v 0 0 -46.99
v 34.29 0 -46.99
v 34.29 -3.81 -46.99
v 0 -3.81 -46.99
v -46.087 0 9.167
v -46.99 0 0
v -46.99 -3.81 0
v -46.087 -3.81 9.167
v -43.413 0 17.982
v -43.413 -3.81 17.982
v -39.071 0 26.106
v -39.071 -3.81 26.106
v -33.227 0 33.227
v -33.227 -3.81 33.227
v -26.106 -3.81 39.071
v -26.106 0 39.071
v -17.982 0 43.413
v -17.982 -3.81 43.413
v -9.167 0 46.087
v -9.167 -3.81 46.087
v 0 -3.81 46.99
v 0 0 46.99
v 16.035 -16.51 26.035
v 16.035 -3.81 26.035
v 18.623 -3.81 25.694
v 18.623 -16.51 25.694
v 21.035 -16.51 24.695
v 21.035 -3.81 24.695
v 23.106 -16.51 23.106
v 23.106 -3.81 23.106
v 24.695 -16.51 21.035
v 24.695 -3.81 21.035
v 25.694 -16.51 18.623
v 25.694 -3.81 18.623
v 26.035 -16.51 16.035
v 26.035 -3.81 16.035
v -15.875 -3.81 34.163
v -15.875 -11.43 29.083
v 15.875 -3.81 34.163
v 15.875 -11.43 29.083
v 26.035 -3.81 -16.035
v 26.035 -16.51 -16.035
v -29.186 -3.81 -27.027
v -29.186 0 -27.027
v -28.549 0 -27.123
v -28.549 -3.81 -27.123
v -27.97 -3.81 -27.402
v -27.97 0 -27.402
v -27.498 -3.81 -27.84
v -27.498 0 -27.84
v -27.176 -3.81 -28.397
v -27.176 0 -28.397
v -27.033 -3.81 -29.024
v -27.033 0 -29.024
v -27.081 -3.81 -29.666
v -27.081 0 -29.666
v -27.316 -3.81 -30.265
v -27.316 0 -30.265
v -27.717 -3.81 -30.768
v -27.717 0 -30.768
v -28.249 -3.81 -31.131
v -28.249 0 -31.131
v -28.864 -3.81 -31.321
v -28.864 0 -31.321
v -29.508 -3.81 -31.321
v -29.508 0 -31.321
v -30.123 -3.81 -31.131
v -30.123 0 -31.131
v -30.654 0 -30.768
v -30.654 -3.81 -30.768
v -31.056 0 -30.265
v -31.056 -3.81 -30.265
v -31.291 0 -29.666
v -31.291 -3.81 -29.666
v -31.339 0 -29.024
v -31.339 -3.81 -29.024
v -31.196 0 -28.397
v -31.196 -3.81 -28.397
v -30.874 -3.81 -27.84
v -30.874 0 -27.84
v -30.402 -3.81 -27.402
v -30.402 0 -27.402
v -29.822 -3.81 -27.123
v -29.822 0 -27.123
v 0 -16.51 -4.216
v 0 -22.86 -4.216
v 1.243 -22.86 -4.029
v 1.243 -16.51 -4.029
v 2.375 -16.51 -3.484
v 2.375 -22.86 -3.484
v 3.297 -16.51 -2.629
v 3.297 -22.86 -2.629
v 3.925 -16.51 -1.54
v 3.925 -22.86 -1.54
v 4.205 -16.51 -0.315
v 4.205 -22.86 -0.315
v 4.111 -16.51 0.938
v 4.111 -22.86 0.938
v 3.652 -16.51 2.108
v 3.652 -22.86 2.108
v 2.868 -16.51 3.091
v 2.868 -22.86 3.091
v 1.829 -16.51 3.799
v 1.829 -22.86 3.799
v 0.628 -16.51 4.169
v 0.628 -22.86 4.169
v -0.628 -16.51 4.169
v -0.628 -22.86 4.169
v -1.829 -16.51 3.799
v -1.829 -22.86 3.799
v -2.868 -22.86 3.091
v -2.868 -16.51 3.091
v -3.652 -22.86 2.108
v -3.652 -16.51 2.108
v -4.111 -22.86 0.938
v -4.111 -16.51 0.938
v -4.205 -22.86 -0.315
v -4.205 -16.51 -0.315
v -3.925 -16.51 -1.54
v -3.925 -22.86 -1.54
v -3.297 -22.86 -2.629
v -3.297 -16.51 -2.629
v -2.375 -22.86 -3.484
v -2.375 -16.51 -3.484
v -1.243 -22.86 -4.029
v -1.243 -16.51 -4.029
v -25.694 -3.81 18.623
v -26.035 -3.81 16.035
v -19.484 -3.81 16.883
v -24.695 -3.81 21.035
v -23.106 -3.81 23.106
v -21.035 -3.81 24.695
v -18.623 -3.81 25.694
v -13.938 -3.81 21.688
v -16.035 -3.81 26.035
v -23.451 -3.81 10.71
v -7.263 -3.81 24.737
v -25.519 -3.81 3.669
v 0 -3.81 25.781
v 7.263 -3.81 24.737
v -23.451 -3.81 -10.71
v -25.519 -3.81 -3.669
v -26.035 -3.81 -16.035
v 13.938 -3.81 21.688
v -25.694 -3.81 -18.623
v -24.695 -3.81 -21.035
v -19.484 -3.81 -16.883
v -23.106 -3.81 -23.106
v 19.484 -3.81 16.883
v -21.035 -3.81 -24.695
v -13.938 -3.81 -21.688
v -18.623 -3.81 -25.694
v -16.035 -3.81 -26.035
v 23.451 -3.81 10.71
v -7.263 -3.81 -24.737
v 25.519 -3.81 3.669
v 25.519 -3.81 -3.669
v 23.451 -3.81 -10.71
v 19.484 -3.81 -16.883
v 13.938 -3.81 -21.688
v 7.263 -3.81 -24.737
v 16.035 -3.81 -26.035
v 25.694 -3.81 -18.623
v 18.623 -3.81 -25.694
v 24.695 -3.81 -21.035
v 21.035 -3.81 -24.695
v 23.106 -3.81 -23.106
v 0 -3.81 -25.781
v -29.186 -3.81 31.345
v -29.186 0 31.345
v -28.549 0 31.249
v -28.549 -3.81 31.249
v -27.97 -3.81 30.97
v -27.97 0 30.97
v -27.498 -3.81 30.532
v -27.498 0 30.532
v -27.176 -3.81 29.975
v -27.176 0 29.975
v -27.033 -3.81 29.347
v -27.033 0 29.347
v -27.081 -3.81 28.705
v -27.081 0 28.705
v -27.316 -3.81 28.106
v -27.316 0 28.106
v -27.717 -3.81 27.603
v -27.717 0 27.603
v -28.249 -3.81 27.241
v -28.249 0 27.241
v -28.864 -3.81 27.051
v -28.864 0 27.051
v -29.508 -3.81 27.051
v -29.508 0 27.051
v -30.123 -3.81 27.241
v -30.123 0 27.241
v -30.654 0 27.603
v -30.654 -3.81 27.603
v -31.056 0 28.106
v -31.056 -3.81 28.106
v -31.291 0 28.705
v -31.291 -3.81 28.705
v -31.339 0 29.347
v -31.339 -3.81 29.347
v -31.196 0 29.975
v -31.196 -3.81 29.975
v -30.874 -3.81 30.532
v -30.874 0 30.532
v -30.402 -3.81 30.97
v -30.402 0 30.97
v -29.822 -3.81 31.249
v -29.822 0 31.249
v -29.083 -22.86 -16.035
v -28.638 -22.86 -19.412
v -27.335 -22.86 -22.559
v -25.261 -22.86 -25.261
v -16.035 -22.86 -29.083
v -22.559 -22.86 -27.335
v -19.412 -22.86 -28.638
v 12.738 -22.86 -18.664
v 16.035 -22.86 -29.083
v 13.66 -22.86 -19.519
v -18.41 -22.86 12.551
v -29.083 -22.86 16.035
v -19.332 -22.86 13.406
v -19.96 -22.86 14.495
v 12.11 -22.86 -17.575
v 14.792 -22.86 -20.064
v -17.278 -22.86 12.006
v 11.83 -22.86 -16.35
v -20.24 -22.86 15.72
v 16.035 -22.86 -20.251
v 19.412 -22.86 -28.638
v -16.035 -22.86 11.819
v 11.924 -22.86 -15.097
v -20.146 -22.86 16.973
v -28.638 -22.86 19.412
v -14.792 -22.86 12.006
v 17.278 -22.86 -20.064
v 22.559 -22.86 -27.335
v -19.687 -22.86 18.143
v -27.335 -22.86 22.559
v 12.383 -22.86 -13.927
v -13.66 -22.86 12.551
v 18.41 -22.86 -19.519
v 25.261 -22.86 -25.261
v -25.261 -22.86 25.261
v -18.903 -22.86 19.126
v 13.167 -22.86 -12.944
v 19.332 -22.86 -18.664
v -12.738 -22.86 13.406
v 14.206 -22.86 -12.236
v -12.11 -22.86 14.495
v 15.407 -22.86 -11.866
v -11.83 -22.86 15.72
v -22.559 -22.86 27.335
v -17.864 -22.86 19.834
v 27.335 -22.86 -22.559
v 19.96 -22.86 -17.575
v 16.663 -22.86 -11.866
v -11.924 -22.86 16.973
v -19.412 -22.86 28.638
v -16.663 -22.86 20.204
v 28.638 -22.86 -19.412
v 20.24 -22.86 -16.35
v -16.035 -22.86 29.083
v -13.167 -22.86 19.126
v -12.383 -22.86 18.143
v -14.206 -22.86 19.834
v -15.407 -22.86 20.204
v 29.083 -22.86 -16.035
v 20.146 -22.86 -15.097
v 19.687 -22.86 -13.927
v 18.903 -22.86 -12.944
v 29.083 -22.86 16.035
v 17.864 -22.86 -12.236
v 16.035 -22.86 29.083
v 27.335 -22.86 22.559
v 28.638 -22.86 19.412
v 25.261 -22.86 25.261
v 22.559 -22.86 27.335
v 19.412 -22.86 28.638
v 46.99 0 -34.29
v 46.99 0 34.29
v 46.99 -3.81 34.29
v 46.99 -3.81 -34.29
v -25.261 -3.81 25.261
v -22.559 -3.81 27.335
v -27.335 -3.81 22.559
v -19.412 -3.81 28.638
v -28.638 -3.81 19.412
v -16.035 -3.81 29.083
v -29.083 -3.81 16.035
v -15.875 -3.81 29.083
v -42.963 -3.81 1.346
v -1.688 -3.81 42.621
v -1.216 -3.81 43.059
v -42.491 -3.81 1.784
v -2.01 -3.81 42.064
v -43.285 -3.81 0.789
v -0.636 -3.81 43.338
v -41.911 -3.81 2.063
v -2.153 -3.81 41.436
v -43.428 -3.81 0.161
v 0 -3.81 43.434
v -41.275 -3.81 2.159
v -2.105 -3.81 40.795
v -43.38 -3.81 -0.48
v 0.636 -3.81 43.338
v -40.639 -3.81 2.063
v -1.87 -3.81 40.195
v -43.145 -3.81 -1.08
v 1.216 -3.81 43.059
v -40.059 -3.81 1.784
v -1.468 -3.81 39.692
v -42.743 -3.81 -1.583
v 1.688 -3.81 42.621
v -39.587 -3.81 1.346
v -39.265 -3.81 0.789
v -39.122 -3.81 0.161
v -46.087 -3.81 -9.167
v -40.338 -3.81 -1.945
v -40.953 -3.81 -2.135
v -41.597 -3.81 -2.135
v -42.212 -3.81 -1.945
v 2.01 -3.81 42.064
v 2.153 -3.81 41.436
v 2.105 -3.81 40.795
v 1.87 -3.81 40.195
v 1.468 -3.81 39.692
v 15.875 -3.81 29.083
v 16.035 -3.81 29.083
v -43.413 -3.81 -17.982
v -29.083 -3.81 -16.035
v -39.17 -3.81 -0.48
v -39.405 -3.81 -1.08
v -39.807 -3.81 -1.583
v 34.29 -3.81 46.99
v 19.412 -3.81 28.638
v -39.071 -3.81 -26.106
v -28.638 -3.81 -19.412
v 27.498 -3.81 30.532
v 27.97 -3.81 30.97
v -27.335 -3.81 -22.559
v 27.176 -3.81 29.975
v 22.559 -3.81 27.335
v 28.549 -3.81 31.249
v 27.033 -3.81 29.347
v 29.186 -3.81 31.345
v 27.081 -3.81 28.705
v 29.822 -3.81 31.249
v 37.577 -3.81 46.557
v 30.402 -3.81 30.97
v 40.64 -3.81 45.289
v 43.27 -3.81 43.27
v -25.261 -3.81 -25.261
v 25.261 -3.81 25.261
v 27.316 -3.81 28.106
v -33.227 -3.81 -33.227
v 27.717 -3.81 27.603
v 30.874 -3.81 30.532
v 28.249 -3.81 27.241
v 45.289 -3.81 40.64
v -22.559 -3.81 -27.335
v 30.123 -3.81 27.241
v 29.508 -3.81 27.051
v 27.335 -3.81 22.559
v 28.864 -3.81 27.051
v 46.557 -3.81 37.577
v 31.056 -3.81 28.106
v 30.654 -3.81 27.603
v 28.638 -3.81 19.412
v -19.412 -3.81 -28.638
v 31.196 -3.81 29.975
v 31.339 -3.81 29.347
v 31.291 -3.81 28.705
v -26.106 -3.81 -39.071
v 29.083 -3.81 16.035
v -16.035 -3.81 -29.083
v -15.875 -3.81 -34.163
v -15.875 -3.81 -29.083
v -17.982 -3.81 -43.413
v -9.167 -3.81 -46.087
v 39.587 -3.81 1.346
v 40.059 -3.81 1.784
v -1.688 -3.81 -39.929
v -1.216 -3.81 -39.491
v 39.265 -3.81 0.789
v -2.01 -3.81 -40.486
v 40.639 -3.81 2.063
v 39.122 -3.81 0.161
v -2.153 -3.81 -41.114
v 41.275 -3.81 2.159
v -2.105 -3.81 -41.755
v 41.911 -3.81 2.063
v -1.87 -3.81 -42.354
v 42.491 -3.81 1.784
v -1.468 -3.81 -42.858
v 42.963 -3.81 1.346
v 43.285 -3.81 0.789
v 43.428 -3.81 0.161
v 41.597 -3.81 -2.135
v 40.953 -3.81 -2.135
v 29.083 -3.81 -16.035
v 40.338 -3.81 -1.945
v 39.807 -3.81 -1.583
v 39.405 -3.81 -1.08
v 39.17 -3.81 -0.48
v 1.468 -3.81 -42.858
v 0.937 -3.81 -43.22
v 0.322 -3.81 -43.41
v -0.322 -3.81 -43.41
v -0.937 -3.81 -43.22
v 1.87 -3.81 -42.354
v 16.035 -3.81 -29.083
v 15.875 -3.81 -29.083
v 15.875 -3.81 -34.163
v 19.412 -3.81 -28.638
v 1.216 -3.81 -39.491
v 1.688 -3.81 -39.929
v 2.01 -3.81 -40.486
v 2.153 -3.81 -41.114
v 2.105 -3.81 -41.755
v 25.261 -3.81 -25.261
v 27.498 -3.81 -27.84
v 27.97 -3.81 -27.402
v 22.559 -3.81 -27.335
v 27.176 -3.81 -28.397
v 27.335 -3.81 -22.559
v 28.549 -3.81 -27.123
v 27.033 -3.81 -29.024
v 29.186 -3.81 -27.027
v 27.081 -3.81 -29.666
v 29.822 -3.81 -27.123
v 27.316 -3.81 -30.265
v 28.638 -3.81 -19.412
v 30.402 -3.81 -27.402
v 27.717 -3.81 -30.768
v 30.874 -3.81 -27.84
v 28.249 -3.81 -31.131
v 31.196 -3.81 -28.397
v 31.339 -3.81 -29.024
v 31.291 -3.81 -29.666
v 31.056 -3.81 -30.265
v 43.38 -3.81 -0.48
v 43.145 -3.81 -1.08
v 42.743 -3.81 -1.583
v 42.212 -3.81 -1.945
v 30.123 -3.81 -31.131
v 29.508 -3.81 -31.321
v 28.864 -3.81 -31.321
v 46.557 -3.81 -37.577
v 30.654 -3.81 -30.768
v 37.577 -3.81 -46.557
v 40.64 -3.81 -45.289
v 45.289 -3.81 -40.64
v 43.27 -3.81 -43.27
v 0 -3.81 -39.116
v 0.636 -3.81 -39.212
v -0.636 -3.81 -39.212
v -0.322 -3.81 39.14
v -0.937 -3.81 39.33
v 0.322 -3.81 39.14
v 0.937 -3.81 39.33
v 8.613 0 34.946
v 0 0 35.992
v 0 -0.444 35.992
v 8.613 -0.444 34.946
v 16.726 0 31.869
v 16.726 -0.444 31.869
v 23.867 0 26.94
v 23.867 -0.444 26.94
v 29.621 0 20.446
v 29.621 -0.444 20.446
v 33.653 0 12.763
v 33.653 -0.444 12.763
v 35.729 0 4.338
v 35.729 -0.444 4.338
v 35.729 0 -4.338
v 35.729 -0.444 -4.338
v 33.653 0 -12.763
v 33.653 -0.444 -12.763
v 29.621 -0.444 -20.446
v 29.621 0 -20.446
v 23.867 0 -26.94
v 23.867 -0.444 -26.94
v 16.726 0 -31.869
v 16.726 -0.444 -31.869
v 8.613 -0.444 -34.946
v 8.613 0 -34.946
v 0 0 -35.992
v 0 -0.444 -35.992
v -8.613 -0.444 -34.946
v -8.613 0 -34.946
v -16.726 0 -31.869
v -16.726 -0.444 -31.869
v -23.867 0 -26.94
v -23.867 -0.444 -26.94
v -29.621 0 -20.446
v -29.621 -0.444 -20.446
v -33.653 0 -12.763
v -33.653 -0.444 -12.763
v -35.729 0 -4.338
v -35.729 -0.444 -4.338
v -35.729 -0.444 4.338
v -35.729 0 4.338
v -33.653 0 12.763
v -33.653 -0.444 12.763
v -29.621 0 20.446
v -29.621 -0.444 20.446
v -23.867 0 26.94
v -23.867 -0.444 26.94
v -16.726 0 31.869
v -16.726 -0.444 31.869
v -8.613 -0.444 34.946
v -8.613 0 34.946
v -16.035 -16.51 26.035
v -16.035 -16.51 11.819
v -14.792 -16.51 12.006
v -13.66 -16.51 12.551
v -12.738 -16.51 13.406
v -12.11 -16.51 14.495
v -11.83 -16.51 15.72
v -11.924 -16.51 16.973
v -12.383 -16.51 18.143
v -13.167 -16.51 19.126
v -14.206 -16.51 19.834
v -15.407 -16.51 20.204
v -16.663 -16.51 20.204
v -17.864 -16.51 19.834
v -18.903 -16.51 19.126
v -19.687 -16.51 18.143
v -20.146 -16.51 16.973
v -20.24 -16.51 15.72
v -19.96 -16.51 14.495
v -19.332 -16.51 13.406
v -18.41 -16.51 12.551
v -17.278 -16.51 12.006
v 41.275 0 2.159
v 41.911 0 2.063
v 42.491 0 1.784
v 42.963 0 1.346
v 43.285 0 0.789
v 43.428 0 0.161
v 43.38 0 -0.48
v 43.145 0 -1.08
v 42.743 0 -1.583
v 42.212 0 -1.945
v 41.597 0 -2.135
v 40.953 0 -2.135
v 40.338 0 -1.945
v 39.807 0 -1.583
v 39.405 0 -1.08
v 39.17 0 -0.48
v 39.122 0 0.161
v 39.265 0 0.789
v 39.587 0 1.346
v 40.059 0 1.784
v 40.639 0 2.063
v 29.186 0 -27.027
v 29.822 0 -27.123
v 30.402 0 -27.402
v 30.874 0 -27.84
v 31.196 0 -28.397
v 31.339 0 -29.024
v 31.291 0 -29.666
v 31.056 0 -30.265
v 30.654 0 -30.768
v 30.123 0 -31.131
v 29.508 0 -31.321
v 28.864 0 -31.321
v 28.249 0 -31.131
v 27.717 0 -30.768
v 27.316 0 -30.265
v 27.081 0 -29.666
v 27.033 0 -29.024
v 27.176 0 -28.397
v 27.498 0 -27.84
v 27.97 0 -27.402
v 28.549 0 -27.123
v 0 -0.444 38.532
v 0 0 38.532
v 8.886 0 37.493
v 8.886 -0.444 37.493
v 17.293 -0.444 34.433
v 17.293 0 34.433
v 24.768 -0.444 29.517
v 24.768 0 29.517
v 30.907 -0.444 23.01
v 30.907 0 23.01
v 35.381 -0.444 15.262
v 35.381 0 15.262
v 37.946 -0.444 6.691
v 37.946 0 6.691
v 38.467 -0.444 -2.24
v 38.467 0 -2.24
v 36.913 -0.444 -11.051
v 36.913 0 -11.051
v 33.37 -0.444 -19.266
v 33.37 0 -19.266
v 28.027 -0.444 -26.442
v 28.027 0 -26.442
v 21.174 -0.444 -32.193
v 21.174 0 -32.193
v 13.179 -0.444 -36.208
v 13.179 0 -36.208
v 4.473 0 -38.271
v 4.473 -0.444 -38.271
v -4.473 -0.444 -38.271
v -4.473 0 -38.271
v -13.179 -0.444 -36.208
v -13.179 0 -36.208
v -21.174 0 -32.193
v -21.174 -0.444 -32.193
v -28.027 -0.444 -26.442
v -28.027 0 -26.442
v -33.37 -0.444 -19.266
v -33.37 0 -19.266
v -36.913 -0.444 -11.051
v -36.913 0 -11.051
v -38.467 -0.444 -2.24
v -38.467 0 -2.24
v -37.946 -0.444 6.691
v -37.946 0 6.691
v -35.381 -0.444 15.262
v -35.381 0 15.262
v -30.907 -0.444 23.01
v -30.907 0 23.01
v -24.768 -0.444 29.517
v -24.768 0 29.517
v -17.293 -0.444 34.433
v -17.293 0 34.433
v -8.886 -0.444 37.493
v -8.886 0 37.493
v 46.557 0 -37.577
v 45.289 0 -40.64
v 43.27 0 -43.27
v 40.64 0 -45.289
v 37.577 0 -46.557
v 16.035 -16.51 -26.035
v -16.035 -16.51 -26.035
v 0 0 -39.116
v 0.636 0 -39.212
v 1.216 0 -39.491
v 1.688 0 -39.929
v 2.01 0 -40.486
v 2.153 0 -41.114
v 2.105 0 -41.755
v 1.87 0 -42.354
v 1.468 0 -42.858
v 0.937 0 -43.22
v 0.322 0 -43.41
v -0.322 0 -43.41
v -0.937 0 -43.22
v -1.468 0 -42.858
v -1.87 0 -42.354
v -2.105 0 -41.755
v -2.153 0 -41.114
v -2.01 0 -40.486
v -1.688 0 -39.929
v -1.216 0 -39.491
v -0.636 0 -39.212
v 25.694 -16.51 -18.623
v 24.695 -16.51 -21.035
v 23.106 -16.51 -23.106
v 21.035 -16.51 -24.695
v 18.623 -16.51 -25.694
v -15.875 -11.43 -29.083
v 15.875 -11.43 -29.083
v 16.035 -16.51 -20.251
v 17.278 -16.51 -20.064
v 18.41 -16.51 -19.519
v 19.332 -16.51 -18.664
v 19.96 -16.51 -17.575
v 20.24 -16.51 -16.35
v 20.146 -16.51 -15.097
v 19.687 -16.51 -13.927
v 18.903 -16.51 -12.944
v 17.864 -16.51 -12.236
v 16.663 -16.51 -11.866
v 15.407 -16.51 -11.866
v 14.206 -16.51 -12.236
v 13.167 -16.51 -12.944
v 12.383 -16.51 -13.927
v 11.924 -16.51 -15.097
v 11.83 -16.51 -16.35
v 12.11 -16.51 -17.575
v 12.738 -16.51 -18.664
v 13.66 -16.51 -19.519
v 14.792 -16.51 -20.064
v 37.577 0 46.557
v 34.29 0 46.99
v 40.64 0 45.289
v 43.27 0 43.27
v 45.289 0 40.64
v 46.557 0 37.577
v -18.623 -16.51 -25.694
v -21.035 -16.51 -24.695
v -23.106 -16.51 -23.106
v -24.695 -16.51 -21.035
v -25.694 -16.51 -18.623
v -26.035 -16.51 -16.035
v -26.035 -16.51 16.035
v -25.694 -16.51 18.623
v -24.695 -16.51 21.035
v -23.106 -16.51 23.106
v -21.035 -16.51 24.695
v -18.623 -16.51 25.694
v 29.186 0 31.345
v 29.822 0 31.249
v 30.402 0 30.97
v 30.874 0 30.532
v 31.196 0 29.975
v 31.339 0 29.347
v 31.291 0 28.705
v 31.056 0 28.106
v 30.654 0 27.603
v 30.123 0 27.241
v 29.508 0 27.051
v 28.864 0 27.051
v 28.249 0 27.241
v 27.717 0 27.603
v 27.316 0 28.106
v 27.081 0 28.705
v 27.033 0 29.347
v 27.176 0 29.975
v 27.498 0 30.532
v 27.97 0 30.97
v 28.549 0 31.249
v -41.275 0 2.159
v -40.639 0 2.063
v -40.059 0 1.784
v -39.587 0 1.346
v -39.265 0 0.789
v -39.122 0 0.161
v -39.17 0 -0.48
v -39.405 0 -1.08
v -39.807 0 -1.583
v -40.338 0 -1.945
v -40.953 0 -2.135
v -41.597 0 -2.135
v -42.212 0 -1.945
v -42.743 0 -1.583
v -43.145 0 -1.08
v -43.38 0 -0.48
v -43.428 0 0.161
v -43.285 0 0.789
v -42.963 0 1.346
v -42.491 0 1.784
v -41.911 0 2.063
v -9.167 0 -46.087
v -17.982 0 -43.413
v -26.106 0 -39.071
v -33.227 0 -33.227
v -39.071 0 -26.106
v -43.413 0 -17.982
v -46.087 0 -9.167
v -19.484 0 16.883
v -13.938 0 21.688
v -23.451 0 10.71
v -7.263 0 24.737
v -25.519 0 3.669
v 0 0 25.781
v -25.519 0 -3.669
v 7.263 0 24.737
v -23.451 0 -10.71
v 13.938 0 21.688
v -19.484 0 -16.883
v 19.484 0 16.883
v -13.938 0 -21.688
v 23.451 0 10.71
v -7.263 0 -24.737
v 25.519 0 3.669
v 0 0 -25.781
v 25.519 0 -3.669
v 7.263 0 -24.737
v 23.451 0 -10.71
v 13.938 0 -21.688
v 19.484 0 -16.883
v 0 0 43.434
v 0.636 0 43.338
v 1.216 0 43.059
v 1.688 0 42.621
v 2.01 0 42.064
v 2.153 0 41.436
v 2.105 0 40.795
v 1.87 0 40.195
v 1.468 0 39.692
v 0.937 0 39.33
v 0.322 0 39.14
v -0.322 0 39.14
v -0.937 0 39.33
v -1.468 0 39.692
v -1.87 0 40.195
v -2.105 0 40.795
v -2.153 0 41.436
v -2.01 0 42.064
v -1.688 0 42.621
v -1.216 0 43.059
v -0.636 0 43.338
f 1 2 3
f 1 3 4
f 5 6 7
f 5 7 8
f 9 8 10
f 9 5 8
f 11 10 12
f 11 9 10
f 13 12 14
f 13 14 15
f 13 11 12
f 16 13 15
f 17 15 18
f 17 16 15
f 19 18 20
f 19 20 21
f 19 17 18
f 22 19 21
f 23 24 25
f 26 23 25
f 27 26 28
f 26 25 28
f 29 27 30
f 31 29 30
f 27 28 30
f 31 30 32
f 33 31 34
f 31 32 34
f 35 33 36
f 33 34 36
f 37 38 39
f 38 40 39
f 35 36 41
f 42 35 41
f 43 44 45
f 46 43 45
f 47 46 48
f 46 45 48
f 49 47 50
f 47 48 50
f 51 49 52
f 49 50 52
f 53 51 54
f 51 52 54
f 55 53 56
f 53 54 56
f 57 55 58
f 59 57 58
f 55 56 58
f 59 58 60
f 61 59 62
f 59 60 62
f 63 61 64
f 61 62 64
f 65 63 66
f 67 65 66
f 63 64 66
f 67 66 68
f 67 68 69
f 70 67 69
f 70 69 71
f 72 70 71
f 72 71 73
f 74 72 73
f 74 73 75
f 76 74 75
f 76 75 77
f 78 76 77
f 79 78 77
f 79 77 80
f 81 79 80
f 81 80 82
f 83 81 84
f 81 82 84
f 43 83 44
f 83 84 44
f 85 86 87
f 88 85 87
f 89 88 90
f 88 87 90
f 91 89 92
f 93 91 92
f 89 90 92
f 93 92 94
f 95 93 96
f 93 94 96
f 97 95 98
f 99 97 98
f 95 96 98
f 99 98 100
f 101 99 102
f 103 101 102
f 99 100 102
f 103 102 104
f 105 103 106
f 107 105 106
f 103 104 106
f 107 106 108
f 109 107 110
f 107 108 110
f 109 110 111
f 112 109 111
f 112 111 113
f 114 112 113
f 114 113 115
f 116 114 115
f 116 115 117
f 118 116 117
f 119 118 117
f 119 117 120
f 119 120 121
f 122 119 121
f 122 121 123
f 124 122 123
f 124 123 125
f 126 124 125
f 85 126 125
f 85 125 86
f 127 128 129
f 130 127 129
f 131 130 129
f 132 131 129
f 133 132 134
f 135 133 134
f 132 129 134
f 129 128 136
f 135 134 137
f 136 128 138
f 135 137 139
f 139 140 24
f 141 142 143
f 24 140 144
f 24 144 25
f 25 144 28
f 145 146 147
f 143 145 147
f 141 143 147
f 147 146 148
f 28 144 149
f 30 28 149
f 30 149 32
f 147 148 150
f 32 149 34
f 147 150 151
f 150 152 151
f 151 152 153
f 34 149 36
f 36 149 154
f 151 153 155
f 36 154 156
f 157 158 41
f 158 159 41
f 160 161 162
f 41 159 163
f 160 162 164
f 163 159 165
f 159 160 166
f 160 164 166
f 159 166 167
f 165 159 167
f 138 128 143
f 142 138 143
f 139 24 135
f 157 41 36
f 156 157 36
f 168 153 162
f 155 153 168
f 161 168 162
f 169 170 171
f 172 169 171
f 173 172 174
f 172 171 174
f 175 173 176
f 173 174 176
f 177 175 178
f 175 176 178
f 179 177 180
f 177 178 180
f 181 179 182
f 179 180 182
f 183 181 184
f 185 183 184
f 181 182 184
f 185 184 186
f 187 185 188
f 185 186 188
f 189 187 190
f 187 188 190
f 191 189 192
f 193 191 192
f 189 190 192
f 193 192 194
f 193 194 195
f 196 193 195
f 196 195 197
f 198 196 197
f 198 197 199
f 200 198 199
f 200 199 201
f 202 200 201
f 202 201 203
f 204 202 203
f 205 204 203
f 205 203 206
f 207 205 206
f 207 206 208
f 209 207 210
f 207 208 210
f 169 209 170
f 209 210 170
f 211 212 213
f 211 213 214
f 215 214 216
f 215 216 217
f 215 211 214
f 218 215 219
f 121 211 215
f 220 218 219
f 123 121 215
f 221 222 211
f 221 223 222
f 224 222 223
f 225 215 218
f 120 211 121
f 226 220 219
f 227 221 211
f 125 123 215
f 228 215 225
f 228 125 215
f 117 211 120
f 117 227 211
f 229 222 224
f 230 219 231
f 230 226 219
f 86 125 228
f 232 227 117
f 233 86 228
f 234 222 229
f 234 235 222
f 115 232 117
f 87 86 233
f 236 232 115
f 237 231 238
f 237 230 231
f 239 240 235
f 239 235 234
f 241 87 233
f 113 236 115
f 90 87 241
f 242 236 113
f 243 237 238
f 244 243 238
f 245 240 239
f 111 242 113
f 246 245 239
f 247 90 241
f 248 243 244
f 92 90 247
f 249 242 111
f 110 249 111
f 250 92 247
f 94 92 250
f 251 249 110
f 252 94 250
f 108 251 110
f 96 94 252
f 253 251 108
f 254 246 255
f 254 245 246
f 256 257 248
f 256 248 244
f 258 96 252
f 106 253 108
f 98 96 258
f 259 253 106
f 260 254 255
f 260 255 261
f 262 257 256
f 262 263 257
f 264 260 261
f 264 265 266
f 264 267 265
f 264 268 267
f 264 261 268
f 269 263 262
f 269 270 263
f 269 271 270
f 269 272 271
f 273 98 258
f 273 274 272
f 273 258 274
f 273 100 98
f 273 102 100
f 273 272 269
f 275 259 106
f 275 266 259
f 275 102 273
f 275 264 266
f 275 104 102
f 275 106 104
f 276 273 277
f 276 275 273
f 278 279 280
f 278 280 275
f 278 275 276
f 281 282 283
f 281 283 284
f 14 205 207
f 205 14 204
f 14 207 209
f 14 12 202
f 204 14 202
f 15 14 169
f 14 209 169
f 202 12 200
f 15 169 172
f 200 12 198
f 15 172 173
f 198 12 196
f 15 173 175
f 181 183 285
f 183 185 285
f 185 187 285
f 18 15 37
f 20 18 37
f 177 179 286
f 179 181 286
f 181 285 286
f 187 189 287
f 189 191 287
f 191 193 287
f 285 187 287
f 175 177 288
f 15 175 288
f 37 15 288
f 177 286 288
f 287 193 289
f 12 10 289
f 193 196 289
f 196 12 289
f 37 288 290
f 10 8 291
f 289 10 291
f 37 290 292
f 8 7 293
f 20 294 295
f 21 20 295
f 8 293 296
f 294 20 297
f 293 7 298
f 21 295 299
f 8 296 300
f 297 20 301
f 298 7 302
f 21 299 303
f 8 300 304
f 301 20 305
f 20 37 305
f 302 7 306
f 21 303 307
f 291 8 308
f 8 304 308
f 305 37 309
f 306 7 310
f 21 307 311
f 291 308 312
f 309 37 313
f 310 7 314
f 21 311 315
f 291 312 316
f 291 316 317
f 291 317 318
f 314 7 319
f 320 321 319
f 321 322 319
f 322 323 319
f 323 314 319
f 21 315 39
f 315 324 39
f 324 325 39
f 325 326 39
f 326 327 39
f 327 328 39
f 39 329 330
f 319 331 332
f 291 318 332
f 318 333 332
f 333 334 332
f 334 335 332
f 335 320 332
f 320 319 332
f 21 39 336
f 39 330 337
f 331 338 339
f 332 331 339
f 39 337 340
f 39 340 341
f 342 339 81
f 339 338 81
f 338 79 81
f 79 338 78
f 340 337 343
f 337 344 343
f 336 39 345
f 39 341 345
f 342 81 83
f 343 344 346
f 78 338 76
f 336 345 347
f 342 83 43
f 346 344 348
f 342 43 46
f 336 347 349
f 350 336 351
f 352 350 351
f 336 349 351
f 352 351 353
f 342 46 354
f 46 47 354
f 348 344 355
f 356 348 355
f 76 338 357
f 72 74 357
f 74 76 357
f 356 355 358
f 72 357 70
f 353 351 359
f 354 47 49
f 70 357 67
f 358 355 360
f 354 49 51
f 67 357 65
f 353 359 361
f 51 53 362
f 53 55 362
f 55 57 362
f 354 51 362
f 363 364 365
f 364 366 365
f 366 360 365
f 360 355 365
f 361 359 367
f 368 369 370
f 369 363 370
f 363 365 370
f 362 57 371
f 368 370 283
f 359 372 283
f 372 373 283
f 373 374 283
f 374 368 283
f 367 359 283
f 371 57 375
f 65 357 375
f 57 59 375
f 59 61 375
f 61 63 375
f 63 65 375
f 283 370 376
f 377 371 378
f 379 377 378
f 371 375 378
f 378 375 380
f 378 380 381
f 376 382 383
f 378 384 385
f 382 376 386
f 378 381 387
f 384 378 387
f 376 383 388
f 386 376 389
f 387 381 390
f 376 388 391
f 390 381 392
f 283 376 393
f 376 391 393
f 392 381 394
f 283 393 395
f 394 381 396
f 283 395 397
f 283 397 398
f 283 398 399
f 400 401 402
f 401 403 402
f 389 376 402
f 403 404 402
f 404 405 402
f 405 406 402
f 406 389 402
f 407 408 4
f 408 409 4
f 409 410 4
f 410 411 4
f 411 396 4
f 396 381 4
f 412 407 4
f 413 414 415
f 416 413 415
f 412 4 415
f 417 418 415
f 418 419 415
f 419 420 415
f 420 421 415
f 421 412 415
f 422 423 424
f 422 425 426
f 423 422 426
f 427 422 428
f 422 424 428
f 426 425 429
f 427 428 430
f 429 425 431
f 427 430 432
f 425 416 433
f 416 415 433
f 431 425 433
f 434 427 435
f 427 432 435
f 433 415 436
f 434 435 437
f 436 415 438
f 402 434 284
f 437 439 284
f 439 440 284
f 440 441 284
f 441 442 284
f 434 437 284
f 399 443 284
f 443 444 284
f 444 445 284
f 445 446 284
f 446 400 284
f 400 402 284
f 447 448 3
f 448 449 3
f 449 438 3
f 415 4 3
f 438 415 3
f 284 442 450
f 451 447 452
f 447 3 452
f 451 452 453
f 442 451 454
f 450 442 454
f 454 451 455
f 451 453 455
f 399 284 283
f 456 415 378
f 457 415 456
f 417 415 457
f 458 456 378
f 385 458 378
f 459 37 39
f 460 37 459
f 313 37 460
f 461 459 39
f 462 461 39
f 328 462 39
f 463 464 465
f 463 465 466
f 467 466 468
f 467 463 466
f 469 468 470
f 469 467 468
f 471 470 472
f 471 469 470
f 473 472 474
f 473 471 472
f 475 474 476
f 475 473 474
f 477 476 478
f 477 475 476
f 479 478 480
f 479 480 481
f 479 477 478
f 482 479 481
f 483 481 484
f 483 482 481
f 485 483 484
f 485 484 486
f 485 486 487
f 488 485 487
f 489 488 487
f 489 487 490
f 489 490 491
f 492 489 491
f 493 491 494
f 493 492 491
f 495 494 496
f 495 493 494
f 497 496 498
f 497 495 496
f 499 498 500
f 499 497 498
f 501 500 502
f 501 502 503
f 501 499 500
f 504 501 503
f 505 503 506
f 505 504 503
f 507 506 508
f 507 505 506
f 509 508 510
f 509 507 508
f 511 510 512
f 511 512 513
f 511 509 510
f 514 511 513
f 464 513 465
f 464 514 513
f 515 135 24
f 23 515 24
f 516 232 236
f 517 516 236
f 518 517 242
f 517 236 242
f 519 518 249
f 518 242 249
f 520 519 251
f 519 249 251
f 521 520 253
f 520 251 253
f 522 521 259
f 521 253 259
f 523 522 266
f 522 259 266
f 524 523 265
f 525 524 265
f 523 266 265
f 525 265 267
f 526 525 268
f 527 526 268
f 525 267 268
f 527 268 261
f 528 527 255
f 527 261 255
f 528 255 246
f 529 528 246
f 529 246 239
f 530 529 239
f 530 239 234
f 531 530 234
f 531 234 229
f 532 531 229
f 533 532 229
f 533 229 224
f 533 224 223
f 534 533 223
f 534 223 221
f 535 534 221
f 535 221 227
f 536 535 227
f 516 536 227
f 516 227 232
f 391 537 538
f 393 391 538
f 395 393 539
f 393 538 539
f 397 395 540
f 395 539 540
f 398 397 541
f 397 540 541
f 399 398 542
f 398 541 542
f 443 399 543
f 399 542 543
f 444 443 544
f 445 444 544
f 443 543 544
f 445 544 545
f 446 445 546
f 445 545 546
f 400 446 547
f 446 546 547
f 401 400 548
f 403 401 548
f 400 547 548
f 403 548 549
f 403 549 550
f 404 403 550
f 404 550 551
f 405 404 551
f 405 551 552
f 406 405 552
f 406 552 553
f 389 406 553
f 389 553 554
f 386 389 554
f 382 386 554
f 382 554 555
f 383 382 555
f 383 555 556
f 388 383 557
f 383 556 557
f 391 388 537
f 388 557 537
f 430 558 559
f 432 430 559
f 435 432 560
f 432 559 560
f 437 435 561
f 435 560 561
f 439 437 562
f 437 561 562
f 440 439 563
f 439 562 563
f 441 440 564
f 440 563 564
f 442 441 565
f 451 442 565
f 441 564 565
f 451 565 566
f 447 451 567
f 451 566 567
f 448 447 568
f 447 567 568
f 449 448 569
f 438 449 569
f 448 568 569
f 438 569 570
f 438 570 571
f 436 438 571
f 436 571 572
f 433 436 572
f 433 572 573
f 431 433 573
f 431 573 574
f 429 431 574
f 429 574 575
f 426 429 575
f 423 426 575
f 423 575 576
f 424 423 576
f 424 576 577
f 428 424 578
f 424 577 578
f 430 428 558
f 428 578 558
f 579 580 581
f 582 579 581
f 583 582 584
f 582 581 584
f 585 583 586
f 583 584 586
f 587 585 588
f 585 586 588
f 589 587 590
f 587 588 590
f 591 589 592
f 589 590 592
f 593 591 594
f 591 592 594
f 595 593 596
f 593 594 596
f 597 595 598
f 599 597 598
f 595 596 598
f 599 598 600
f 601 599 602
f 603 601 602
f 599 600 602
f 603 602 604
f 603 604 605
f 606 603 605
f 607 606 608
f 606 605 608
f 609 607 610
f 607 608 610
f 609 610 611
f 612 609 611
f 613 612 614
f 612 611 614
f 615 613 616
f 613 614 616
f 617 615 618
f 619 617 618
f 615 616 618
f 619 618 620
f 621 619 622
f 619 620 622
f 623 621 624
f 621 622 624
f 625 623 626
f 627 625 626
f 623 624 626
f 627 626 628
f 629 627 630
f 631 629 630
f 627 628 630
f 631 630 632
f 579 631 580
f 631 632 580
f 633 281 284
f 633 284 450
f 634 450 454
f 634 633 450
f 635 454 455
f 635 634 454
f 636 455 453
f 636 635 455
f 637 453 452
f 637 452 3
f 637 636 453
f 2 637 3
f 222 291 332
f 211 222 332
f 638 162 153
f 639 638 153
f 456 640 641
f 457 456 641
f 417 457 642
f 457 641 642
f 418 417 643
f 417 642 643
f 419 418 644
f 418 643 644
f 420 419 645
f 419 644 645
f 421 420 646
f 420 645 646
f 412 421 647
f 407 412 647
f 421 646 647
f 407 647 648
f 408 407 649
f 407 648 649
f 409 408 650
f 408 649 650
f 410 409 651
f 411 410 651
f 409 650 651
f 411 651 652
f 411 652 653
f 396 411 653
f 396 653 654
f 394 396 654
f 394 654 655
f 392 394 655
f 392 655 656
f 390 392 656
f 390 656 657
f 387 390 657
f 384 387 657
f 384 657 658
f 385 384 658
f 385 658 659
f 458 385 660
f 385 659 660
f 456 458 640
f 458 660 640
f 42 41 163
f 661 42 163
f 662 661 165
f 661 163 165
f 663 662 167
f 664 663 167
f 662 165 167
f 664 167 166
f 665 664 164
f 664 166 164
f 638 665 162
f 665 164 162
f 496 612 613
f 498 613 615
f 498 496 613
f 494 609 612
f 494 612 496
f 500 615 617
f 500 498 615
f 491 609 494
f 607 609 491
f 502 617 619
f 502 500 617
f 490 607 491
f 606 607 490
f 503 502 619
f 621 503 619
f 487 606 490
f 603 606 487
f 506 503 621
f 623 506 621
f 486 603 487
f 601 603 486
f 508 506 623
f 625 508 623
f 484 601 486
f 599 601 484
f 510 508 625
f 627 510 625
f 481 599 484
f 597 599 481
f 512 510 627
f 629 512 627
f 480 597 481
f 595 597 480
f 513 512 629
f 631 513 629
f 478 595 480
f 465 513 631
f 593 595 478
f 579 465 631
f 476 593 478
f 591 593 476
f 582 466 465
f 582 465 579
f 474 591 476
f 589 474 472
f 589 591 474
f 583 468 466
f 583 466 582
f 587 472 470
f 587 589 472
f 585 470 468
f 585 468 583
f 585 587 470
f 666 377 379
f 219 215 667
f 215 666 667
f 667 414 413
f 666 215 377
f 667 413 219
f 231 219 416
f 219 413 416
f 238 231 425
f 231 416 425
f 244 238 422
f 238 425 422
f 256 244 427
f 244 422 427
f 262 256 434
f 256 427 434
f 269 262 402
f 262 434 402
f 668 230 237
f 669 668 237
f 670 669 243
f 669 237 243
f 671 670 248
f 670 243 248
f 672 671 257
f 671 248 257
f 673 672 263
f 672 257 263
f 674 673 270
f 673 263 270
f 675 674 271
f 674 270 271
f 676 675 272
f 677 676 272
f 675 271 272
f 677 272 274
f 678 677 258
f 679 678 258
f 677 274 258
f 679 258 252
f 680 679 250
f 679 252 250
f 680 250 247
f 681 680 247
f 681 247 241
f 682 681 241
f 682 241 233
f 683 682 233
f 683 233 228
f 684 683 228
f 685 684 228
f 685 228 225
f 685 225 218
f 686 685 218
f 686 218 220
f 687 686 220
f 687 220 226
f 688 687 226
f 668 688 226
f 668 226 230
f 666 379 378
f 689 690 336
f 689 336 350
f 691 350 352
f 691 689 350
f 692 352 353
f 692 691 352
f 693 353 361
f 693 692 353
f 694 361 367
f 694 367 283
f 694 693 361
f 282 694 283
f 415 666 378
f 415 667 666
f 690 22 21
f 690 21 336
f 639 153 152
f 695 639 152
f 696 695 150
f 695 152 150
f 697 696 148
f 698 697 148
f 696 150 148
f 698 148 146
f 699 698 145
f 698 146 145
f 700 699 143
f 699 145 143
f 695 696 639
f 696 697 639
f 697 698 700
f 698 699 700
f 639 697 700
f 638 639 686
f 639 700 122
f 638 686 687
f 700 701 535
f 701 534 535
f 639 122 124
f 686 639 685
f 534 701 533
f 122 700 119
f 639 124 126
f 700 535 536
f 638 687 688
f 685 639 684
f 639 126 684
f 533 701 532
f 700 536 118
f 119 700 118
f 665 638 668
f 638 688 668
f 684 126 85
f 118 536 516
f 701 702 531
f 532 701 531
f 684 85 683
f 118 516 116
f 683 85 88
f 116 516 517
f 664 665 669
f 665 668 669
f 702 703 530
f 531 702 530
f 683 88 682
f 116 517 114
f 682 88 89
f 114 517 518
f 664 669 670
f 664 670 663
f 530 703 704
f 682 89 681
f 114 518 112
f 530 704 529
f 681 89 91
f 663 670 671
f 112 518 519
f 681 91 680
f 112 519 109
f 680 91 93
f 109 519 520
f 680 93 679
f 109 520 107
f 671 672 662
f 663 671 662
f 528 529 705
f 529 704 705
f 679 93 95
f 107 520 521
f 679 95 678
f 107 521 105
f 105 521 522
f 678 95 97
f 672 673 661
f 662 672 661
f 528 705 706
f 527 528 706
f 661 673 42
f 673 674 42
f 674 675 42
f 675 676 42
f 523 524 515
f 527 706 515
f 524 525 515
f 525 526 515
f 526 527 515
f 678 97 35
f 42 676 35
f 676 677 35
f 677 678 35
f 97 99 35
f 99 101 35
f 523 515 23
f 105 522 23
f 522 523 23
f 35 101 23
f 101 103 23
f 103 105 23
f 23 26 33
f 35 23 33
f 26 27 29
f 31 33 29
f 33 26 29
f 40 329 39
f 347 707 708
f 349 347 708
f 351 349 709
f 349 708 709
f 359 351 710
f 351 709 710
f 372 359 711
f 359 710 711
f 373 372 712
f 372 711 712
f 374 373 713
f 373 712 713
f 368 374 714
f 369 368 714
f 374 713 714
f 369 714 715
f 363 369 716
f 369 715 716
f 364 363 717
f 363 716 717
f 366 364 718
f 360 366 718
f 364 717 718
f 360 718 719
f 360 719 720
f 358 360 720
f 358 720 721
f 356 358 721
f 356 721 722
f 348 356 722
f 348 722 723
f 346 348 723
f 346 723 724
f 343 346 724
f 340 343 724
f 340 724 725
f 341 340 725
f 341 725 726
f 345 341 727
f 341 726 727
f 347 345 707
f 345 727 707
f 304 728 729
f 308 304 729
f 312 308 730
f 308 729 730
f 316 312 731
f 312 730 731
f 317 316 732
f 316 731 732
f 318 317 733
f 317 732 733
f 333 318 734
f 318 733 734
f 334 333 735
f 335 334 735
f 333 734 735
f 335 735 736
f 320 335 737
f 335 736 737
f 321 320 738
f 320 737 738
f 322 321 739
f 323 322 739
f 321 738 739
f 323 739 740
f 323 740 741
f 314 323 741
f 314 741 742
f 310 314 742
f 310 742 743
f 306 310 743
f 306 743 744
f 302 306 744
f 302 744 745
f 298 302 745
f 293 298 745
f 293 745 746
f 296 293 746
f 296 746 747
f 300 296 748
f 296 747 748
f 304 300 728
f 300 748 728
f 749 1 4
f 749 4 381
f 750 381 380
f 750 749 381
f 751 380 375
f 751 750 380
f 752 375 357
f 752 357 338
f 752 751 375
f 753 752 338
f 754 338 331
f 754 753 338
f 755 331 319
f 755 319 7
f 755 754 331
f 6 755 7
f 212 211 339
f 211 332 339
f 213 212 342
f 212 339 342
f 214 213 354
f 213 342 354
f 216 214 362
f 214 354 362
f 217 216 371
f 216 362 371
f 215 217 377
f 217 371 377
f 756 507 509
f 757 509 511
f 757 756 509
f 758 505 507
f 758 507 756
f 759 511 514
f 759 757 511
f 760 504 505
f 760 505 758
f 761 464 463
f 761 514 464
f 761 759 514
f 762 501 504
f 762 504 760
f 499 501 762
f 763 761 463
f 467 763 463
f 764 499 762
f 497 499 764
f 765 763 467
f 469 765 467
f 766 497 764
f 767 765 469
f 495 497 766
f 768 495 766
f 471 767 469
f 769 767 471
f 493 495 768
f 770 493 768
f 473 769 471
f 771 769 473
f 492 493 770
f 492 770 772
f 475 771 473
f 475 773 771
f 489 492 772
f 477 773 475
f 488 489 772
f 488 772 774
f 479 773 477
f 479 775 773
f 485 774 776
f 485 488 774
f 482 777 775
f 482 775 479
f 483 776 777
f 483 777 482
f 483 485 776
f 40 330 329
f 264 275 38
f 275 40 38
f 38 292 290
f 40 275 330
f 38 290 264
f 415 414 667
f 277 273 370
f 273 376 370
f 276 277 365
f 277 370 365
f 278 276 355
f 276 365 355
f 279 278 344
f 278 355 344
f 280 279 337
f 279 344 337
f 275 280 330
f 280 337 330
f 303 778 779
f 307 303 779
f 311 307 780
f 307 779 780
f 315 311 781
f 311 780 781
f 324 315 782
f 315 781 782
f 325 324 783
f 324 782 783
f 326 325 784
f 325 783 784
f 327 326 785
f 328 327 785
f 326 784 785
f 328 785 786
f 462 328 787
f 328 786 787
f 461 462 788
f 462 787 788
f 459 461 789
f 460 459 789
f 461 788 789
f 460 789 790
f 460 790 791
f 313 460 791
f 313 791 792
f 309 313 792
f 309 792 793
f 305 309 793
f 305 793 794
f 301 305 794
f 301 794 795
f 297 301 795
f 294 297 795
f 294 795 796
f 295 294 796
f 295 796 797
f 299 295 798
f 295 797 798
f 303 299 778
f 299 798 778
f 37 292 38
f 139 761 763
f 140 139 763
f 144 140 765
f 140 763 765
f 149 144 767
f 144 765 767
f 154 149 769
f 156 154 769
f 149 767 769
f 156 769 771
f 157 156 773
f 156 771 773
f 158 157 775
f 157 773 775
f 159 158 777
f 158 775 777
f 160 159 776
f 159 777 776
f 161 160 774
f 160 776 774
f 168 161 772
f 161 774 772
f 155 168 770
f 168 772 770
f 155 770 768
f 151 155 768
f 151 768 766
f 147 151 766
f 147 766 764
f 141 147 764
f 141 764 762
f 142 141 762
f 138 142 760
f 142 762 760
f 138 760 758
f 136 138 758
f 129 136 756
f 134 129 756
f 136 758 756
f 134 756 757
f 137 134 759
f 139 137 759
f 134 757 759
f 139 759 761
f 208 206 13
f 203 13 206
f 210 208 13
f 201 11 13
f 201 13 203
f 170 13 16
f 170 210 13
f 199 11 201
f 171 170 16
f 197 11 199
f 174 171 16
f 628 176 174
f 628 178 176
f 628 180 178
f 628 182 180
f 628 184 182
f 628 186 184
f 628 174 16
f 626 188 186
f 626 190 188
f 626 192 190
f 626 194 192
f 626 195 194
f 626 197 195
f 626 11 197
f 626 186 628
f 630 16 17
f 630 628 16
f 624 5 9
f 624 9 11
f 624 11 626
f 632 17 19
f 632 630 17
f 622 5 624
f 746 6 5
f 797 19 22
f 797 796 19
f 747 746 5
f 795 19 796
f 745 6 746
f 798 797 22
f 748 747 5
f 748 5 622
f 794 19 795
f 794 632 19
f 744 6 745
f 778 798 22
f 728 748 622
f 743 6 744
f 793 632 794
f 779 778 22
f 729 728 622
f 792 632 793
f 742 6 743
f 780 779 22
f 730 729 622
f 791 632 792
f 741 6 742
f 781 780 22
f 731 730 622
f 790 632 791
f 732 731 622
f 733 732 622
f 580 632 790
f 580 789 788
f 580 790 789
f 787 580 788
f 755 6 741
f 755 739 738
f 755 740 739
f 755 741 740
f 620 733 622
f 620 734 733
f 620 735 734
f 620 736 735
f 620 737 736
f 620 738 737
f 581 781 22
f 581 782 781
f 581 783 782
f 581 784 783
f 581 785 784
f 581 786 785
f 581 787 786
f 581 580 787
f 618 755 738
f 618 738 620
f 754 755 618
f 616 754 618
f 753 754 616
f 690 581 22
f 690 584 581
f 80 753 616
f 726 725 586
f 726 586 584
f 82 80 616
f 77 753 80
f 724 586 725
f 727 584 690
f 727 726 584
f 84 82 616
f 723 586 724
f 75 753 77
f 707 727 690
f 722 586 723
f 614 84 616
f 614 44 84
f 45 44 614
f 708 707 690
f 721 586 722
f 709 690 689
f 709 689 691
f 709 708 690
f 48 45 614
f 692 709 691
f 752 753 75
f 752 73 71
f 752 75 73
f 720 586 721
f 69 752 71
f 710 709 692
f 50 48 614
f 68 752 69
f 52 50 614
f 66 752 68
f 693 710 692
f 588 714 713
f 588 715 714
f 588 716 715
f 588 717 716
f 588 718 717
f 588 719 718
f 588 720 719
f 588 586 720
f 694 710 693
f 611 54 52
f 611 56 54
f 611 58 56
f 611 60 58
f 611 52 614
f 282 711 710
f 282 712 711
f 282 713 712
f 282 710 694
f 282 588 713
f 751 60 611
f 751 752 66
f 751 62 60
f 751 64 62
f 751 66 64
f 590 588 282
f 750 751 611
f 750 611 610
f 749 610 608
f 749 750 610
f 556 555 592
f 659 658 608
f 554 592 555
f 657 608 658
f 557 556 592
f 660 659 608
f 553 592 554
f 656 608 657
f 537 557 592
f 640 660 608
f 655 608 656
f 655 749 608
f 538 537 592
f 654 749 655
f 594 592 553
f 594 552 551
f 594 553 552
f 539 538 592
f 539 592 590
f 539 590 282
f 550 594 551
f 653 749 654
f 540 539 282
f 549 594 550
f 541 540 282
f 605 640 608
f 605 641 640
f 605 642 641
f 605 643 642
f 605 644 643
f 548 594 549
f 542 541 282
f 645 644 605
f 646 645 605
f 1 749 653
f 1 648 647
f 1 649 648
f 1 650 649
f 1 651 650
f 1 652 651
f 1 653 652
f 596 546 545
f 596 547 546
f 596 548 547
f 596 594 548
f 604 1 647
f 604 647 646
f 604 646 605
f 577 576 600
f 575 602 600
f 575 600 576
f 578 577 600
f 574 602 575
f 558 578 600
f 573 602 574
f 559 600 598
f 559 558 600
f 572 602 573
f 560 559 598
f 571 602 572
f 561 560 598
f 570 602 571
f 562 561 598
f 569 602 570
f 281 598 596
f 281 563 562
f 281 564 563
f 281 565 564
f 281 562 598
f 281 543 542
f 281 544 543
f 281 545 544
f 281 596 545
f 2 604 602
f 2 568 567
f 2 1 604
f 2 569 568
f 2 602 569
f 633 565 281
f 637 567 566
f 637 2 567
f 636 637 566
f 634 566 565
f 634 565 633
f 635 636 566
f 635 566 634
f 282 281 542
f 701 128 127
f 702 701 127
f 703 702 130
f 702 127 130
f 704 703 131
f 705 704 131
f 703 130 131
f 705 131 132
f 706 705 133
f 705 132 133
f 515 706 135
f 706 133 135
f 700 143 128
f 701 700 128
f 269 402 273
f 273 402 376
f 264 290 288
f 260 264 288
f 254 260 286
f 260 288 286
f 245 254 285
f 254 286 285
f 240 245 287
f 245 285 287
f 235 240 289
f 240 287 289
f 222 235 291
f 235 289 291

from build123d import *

# Parameters (mm, degrees)
SKETCH2_R           = 2.159
BOSS_EXTRUDE3_DEPTH = 3.81
SKETCH1_R           = 38.5318
SKETCH1_R_2         = 35.9918
CUT_EXTRUDE1_DEPTH  = 0.4445
SKETCH4_R           = 25.781
CUT_EXTRUDE2_DEPTH  = 3.81
BOSS_EXTRUDE4_DEPTH = 12.7
BOSS_EXTRUDE5_DEPTH = 6.35
CUT_EXTRUDE3_START  = -3.81
CUT_EXTRUDE3_DEPTH  = 3.81
BOSS_EXTRUDE6_DEPTH = 15.875
CUT_EXTRUDE4_REACH  = 72.276
SKETCH12_R          = 4.2164


with BuildPart() as part:
    # Sketch2 → Boss-Extrude3 (new body)
    with BuildSketch(Plane(origin=(0, 0, 0), x_dir=(1, 0, 0), z_dir=(0, 1, 0))):
        with BuildLine():
            Line((34.29, 46.99), (-34.29, 46.99))
            ThreePointArc((-34.29, 46.99), (-43.270256121, 43.270256121), (-46.99, 34.29))
            Line((-46.99, 34.29), (-46.99, -34.29))
            ThreePointArc((-46.99, -34.29), (-43.270256121, -43.270256121), (-34.29, -46.99))
            Line((-34.29, -46.99), (34.29, -46.99))
            ThreePointArc((34.29, -46.99), (43.270256121, -43.270256121), (46.99, -34.29))
            Line((46.99, -34.29), (46.99, 34.29))
            ThreePointArc((46.99, 34.29), (43.270256121, 43.270256121), (34.29, 46.99))
        make_face()
        with Locations(Location((0, 41.275, 0), (0, 0, 270))):
            Circle(SKETCH2_R, mode=Mode.SUBTRACT)
        with Locations(Location((29.185832393, 29.185832393, 0), (0, 0, 270))):
            Circle(SKETCH2_R, mode=Mode.SUBTRACT)
        with Locations(Location((41.275, 0, 0), (0, 0, 270))):
            Circle(SKETCH2_R, mode=Mode.SUBTRACT)
        with Locations(Location((29.185832393, -29.185832393, 0), (0, 0, 270))):
            Circle(SKETCH2_R, mode=Mode.SUBTRACT)
        with Locations(Location((0, -41.275, 0), (0, 0, 270))):
            Circle(SKETCH2_R, mode=Mode.SUBTRACT)
        with Locations(Location((-29.185832393, -29.185832393, 0), (0, 0, 270))):
            Circle(SKETCH2_R, mode=Mode.SUBTRACT)
        with Locations(Location((-41.275, 0, 0), (0, 0, 270))):
            Circle(SKETCH2_R, mode=Mode.SUBTRACT)
        with Locations(Location((-29.185832393, 29.185832393, 0), (0, 0, 270))):
            Circle(SKETCH2_R, mode=Mode.SUBTRACT)
    extrude(amount=-BOSS_EXTRUDE3_DEPTH)

    # Sketch1 → Cut-Extrude1 (cut)
    with BuildSketch(Plane(origin=(0, 0, 0), x_dir=(1, 0, 0), z_dir=(0, 1, 0))):
        with Locations(Location((0, 0, 0), (0, 0, 270))):
            Circle(SKETCH1_R)
        with Locations(Location((0, 0, 0), (0, 0, 270))):
            Circle(SKETCH1_R_2, mode=Mode.SUBTRACT)
    extrude(amount=-CUT_EXTRUDE1_DEPTH, mode=Mode.SUBTRACT)

    # Sketch4 → Cut-Extrude2 (cut)
    with BuildSketch(Plane(origin=(0, 0, 0), x_dir=(1, 0, 0), z_dir=(0, 1, 0))):
        with Locations(Location((0, 0, 0), (0, 0, 270))):
            Circle(SKETCH4_R)
    extrude(amount=-CUT_EXTRUDE2_DEPTH, mode=Mode.SUBTRACT)

    # Sketch5 → Boss-Extrude4 (add)
    with BuildSketch(Plane.XZ.offset(3.81)):
        with BuildLine():
            ThreePointArc((-29.083, 16.035), (-25.261329281, 25.261329281), (-16.035, 29.083))
            Line((-16.035, 29.083), (16.035, 29.083))
            ThreePointArc((16.035, 29.083), (25.261329281, 25.261329281), (29.083, 16.035))
            Line((29.083, 16.035), (29.083, -16.035))
            ThreePointArc((29.083, -16.035), (25.261329281, -25.261329281), (16.035, -29.083))
            Line((16.035, -29.083), (-16.035, -29.083))
            ThreePointArc((-16.035, -29.083), (-25.261329281, -25.261329281), (-29.083, -16.035))
            Line((-29.083, -16.035), (-29.083, 16.035))
        make_face()
        with BuildLine():
            Line((-26.035, -16.035), (-26.035, 16.035))
            ThreePointArc((-26.035, 16.035), (-23.106067812, 23.106067812), (-16.035, 26.035))
            Line((-16.035, 26.035), (16.035, 26.035))
            ThreePointArc((16.035, 26.035), (23.106067812, 23.106067812), (26.035, 16.035))
            Line((26.035, 16.035), (26.035, -16.035))
            ThreePointArc((26.035, -16.035), (23.106067812, -23.106067812), (16.035, -26.035))
            Line((16.035, -26.035), (-16.035, -26.035))
            ThreePointArc((-16.035, -26.035), (-23.106067812, -23.106067812), (-26.035, -16.035))
        make_face(mode=Mode.SUBTRACT)
    extrude(amount=BOSS_EXTRUDE4_DEPTH)

    # Sketch6 → Boss-Extrude5 (add)
    with BuildSketch(Plane.XZ.offset(16.51)):
        with BuildLine():
            Line((-29.083, 16.035), (-29.083, -16.035))
            ThreePointArc((-29.083, -16.035), (-25.261329281, -25.261329281), (-16.035, -29.083))
            Line((-16.035, -29.083), (16.035, -29.083))
            ThreePointArc((16.035, -29.083), (25.261329281, -25.261329281), (29.083, -16.035))
            Line((29.083, -16.035), (29.083, 16.035))
            ThreePointArc((29.083, 16.035), (25.261329281, 25.261329281), (16.035, 29.083))
            Line((16.035, 29.083), (-16.035, 29.083))
            ThreePointArc((-16.035, 29.083), (-25.261329281, 25.261329281), (-29.083, 16.035))
        make_face()
    extrude(amount=BOSS_EXTRUDE5_DEPTH)

    # Sketch7 → Cut-Extrude3 (cut)
    with BuildSketch(Plane.XZ.offset(3.81).offset(CUT_EXTRUDE3_START)):
        with BuildLine():
            Line((-46.99, 34.29), (-46.99, 0))
            ThreePointArc((-46.99, 0), (-33.226947648, 33.226947648), (0, 46.99))
            Line((0, 46.99), (-34.29, 46.99))
            ThreePointArc((-34.29, 46.99), (-43.270256121, 43.270256121), (-46.99, 34.29))
        make_face()
        with BuildLine():
            ThreePointArc((0, -46.99), (-33.226947648, -33.226947648), (-46.99, 0))
            Line((-46.99, 0), (-46.99, -34.29))
            ThreePointArc((-46.99, -34.29), (-43.270256121, -43.270256121), (-34.29, -46.99))
            Line((-34.29, -46.99), (0, -46.99))
        make_face()
    extrude(amount=CUT_EXTRUDE3_DEPTH, mode=Mode.SUBTRACT)

    # Sketch8 → Boss-Extrude6 (add, symmetric)
    with BuildSketch(Plane(origin=(0, 0, 0), x_dir=(0, 0, -1), z_dir=(1, 0, 0))):
        Polygon((-29.083, -3.81), (-29.083, -11.43), (-34.163, -3.81), align=None)
    boss_extrude6 = extrude(amount=BOSS_EXTRUDE6_DEPTH, both=True)

    # Mirror1: Boss-Extrude6 across plane
    add(boss_extrude6.mirror(Plane.XY))

    # Sketch12 → Cut-Extrude4 (cut, up to next)
    with BuildSketch(Plane.XZ.offset(22.86), mode=Mode.PRIVATE) as cut_extrude4_sk1:
        with Locations(Location((-16.035, 16.035, 0), (0, 0, 270))):
            Circle(SKETCH12_R)
    cut_extrude4_tool1 = extrude(cut_extrude4_sk1.sketch, amount=-CUT_EXTRUDE4_REACH, mode=Mode.PRIVATE) & part.part
    # Sketch12 → Cut-Extrude4 (cut, up to next)
    with BuildSketch(Plane.XZ.offset(22.86), mode=Mode.PRIVATE) as cut_extrude4_sk2:
        with Locations(Location((16.035, -16.035, 0), (0, 0, 270))):
            Circle(SKETCH12_R)
    cut_extrude4_tool2 = extrude(cut_extrude4_sk2.sketch, amount=-CUT_EXTRUDE4_REACH, mode=Mode.PRIVATE) & part.part
    # Sketch12 → Cut-Extrude4 (cut, up to next)
    with BuildSketch(Plane.XZ.offset(22.86), mode=Mode.PRIVATE) as cut_extrude4_sk3:
        with Locations(Location((0, 0, 0), (0, 0, 270))):
            Circle(SKETCH12_R)
    cut_extrude4_tool3 = extrude(cut_extrude4_sk3.sketch, amount=-CUT_EXTRUDE4_REACH, mode=Mode.PRIVATE) & part.part
    add(cut_extrude4_tool1.solids().sort_by_distance((-16.035, -22.86, 16.035))[0], mode=Mode.SUBTRACT)
    add(cut_extrude4_tool2.solids().sort_by_distance((16.035, -22.86, -16.035))[0], mode=Mode.SUBTRACT)
    add(cut_extrude4_tool3.solids().sort_by_distance((0, -22.86, 0))[0], mode=Mode.SUBTRACT)


solid = part.part
